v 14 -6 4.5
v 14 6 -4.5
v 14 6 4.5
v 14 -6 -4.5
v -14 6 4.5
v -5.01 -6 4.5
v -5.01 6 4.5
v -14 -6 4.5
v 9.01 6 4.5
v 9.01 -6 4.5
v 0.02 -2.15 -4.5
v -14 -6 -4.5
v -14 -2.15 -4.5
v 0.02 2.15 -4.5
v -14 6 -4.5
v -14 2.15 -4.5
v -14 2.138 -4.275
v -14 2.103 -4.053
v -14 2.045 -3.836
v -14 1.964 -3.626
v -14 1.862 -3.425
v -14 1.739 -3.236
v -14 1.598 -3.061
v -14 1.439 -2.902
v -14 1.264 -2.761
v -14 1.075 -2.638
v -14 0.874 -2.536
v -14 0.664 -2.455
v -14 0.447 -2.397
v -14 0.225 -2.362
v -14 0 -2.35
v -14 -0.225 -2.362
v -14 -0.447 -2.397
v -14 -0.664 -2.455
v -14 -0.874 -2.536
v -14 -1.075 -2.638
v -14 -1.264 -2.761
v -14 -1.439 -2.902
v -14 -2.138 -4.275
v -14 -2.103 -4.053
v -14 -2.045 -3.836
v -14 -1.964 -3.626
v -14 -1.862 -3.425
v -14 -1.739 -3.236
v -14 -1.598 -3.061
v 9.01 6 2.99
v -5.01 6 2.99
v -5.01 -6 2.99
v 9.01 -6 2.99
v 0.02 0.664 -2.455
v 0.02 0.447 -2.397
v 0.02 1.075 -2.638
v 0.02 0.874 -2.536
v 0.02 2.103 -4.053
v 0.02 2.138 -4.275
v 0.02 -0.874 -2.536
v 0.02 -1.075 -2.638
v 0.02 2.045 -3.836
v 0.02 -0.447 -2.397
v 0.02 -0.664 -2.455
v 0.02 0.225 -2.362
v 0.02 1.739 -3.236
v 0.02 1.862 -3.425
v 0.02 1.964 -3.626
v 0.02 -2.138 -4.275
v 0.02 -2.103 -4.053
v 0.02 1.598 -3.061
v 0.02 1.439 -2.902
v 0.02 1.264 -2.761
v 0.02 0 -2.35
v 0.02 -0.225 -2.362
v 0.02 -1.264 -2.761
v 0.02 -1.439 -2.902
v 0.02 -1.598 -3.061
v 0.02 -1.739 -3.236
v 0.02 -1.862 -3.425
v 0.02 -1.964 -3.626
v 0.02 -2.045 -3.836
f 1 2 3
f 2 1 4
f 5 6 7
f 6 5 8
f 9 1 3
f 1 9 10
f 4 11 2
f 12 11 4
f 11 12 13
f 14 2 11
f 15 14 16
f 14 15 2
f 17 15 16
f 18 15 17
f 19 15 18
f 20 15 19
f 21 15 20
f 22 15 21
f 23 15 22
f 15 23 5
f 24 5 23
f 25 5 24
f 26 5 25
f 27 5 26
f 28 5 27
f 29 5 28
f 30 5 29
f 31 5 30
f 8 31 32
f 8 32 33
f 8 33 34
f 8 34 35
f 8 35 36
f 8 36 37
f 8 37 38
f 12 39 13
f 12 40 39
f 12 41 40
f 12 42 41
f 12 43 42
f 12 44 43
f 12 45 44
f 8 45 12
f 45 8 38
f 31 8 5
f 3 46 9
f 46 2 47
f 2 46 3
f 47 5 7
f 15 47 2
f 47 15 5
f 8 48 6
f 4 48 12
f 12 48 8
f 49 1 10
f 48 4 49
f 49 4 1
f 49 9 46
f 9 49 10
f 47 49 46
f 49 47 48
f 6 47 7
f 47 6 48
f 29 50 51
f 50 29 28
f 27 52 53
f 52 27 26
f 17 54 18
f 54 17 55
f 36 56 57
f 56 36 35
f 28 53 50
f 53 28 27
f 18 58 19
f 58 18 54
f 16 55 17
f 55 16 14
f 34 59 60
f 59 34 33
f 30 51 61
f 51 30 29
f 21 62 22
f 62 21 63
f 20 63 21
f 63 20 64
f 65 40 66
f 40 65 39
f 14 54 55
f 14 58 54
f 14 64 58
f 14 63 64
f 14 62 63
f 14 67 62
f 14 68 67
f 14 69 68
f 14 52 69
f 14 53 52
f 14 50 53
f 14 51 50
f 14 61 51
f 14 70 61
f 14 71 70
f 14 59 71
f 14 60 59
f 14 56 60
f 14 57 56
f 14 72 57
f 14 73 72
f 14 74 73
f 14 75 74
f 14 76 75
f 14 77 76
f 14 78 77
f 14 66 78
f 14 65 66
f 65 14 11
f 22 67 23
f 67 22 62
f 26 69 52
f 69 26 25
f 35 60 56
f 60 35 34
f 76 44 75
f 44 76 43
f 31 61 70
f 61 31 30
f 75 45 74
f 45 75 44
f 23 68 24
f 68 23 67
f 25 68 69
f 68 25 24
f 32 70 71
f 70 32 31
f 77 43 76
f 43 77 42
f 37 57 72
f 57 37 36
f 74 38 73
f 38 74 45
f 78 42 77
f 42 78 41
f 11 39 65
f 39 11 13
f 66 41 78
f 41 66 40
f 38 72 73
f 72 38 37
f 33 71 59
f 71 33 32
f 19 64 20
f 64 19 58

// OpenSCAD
// Snap panel clip with a U-shaped panel slot.
$fn = 60;
eps = 0.02;
panel_t = 1;
clip_w = 12;
clip_l = 28;
clip_h = panel_t + 8;
slot = panel_t + 0.5;
difference() {
    cube([clip_l,clip_w,clip_h],center=true);
    translate([2,0,clip_h/2-slot/2]) cube([clip_l/2+eps,clip_w+2*eps,slot+eps],center=true);
    translate([-clip_l/2-eps,0,-clip_h/2]) rotate([0,90,0]) cylinder(d=4.3,h=clip_l/2+2*eps);
}
